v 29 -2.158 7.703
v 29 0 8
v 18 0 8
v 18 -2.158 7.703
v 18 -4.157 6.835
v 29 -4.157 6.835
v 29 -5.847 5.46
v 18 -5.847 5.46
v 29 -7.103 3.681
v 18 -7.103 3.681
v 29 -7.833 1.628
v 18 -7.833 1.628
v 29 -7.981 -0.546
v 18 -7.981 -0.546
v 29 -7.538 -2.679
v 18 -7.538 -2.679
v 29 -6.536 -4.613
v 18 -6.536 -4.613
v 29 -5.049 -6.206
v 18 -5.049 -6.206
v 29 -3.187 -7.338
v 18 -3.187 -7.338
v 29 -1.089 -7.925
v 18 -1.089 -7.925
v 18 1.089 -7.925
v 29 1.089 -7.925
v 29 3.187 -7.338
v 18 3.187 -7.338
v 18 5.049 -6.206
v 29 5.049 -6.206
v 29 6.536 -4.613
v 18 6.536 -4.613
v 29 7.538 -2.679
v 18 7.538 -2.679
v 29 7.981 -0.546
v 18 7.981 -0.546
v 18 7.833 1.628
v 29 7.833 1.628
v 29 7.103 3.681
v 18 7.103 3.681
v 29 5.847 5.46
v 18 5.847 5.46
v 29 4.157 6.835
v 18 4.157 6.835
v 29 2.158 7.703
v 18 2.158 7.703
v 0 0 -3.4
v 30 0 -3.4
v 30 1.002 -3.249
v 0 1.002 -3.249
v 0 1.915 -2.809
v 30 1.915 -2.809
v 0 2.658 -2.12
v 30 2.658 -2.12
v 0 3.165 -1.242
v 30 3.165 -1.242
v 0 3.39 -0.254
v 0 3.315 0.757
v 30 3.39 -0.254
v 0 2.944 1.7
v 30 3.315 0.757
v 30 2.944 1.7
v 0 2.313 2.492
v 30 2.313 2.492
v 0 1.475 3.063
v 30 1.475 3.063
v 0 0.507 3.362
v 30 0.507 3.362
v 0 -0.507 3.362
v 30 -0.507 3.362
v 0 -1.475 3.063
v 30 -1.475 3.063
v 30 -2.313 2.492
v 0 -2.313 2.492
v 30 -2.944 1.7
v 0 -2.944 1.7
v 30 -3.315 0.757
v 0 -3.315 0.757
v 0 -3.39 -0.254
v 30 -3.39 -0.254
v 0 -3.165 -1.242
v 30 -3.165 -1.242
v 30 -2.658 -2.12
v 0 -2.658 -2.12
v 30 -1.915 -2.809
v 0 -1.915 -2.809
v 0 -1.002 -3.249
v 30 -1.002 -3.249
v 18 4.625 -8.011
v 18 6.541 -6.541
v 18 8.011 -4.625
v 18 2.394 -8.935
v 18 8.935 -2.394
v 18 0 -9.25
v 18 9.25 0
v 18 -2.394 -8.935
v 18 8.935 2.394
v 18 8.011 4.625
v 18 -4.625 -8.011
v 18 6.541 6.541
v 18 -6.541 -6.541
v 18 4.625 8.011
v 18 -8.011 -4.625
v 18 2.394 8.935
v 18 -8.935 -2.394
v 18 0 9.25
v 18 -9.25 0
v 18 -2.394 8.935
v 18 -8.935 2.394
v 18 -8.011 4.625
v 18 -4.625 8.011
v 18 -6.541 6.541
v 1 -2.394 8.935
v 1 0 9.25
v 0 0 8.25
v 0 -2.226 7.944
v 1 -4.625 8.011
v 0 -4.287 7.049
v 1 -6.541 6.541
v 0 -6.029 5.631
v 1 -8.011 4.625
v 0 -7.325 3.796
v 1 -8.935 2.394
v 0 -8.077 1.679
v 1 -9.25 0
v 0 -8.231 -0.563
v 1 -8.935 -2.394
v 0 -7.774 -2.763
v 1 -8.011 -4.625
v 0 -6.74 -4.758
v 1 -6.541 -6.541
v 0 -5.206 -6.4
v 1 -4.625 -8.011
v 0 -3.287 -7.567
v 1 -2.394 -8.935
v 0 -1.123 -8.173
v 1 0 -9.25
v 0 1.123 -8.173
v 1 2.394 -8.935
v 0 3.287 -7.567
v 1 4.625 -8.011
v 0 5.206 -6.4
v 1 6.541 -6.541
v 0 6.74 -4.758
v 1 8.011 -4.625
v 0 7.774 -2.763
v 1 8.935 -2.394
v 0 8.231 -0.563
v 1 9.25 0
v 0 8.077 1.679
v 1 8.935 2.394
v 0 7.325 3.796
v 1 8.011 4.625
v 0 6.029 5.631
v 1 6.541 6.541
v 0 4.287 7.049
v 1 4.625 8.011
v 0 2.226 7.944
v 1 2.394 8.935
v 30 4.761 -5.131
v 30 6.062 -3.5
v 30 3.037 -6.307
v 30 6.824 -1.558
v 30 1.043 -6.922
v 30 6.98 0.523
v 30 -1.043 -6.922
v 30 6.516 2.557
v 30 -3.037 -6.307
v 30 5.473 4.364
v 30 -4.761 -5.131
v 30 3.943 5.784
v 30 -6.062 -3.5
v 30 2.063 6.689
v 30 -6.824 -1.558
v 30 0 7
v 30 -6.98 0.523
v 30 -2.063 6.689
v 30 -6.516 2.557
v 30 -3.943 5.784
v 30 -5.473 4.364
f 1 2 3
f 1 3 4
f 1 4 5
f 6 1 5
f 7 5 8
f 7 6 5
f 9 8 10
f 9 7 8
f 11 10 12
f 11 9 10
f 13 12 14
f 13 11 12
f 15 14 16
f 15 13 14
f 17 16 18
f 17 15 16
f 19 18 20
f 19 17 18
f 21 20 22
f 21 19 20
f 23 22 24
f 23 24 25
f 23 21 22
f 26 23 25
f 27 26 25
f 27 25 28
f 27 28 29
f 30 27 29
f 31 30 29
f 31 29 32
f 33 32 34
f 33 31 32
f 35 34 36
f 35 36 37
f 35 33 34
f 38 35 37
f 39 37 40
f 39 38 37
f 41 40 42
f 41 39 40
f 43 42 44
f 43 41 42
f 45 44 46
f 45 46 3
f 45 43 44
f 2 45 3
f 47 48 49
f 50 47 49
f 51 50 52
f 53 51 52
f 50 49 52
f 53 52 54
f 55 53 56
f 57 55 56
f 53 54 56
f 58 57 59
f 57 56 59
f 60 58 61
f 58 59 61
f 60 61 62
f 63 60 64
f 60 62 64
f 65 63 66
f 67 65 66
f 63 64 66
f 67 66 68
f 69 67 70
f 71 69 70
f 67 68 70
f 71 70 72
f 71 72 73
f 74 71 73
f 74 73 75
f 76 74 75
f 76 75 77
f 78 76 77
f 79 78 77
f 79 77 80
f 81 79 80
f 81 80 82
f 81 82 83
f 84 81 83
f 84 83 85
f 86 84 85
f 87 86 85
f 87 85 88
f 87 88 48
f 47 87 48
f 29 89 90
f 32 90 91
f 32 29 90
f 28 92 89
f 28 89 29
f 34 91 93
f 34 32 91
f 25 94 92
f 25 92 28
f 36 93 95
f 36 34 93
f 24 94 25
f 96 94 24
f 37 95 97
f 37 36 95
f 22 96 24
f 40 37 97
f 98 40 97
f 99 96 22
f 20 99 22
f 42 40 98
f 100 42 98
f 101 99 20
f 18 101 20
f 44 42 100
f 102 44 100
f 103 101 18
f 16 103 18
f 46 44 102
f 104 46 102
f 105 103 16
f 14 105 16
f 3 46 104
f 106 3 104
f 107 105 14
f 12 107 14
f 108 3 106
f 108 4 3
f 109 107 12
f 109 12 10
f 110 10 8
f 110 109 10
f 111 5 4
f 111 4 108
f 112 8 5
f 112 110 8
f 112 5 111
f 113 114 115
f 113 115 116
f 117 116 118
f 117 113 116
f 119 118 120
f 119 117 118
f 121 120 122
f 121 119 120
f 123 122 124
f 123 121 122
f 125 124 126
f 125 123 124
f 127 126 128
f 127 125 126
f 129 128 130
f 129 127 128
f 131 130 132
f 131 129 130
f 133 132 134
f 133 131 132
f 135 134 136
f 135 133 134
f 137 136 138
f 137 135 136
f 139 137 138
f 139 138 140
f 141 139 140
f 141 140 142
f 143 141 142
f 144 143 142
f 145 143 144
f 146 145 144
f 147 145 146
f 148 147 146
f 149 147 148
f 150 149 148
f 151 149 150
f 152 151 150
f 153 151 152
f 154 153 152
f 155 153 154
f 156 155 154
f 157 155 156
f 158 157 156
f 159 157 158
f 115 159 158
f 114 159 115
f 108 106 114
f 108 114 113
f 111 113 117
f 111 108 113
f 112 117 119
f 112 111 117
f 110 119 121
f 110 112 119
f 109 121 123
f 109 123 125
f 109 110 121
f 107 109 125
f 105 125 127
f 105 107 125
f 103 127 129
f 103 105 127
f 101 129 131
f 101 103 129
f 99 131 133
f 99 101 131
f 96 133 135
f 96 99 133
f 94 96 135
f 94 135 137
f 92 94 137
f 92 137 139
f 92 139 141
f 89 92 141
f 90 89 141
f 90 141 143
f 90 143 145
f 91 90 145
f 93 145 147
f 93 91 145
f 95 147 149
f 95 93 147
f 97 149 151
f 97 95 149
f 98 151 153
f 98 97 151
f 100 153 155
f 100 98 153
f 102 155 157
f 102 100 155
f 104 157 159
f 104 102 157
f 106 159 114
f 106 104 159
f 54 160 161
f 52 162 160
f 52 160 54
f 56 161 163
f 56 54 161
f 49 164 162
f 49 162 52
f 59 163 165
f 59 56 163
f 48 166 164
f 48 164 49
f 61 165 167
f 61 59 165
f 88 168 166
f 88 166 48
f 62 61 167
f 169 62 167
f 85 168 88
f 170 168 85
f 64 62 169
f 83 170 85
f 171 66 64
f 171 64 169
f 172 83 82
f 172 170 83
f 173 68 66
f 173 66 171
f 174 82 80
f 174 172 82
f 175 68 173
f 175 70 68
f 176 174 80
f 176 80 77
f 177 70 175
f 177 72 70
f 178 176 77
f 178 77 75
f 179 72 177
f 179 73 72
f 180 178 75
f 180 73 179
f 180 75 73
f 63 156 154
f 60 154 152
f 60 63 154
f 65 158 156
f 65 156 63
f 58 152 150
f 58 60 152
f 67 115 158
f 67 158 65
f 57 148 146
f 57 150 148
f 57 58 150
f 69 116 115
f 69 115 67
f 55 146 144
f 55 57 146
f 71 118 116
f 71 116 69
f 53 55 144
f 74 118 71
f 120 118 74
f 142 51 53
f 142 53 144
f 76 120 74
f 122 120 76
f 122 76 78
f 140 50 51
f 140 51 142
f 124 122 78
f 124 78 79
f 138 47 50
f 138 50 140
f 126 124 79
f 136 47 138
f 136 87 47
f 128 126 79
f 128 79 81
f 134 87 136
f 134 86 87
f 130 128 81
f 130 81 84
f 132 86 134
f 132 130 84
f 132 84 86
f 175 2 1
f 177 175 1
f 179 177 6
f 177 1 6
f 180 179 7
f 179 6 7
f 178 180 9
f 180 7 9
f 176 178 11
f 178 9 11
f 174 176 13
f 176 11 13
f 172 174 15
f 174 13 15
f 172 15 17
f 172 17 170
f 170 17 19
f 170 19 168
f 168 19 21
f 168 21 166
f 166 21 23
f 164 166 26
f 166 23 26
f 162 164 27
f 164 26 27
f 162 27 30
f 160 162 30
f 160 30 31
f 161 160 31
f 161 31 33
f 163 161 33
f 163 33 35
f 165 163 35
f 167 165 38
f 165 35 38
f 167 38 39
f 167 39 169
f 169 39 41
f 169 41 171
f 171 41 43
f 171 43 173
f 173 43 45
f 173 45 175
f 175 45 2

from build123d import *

# Parameters (mm, degrees)
HOLE_WIZARD_M82_D = 6.8
CHAMFER_1_SIZE    = 1


with BuildPart() as part:
    # Эскиз1 → Повернуть1 (revolve)
    with BuildSketch(Plane.XY, mode=Mode.PRIVATE) as revolve_1_sk:
        Polygon((0, 3), (0, 9.25), (18, 9.25), (18, 8), (30, 8), (30, 3), align=None)
    revolve(revolve_1_sk.sketch.rotate(Axis((0, 0, 0), (1, 0, 0)), 90), axis=Axis((0, 0, 0), (1, 0, 0)))

    # Отверстие обработанное метчиком M82 (through all)
    with Locations(Plane.ZY):
        with Locations((0, 0)):
            Hole(HOLE_WIZARD_M82_D / 2)

    # Фаска1
    chamfer_1_edges = [part.edges().sort_by_distance(p)[0] for p in [
        (30, 0, -8),
        (0, 0, -9.25),
    ]]
    chamfer(chamfer_1_edges, length=CHAMFER_1_SIZE)


solid = part.part
